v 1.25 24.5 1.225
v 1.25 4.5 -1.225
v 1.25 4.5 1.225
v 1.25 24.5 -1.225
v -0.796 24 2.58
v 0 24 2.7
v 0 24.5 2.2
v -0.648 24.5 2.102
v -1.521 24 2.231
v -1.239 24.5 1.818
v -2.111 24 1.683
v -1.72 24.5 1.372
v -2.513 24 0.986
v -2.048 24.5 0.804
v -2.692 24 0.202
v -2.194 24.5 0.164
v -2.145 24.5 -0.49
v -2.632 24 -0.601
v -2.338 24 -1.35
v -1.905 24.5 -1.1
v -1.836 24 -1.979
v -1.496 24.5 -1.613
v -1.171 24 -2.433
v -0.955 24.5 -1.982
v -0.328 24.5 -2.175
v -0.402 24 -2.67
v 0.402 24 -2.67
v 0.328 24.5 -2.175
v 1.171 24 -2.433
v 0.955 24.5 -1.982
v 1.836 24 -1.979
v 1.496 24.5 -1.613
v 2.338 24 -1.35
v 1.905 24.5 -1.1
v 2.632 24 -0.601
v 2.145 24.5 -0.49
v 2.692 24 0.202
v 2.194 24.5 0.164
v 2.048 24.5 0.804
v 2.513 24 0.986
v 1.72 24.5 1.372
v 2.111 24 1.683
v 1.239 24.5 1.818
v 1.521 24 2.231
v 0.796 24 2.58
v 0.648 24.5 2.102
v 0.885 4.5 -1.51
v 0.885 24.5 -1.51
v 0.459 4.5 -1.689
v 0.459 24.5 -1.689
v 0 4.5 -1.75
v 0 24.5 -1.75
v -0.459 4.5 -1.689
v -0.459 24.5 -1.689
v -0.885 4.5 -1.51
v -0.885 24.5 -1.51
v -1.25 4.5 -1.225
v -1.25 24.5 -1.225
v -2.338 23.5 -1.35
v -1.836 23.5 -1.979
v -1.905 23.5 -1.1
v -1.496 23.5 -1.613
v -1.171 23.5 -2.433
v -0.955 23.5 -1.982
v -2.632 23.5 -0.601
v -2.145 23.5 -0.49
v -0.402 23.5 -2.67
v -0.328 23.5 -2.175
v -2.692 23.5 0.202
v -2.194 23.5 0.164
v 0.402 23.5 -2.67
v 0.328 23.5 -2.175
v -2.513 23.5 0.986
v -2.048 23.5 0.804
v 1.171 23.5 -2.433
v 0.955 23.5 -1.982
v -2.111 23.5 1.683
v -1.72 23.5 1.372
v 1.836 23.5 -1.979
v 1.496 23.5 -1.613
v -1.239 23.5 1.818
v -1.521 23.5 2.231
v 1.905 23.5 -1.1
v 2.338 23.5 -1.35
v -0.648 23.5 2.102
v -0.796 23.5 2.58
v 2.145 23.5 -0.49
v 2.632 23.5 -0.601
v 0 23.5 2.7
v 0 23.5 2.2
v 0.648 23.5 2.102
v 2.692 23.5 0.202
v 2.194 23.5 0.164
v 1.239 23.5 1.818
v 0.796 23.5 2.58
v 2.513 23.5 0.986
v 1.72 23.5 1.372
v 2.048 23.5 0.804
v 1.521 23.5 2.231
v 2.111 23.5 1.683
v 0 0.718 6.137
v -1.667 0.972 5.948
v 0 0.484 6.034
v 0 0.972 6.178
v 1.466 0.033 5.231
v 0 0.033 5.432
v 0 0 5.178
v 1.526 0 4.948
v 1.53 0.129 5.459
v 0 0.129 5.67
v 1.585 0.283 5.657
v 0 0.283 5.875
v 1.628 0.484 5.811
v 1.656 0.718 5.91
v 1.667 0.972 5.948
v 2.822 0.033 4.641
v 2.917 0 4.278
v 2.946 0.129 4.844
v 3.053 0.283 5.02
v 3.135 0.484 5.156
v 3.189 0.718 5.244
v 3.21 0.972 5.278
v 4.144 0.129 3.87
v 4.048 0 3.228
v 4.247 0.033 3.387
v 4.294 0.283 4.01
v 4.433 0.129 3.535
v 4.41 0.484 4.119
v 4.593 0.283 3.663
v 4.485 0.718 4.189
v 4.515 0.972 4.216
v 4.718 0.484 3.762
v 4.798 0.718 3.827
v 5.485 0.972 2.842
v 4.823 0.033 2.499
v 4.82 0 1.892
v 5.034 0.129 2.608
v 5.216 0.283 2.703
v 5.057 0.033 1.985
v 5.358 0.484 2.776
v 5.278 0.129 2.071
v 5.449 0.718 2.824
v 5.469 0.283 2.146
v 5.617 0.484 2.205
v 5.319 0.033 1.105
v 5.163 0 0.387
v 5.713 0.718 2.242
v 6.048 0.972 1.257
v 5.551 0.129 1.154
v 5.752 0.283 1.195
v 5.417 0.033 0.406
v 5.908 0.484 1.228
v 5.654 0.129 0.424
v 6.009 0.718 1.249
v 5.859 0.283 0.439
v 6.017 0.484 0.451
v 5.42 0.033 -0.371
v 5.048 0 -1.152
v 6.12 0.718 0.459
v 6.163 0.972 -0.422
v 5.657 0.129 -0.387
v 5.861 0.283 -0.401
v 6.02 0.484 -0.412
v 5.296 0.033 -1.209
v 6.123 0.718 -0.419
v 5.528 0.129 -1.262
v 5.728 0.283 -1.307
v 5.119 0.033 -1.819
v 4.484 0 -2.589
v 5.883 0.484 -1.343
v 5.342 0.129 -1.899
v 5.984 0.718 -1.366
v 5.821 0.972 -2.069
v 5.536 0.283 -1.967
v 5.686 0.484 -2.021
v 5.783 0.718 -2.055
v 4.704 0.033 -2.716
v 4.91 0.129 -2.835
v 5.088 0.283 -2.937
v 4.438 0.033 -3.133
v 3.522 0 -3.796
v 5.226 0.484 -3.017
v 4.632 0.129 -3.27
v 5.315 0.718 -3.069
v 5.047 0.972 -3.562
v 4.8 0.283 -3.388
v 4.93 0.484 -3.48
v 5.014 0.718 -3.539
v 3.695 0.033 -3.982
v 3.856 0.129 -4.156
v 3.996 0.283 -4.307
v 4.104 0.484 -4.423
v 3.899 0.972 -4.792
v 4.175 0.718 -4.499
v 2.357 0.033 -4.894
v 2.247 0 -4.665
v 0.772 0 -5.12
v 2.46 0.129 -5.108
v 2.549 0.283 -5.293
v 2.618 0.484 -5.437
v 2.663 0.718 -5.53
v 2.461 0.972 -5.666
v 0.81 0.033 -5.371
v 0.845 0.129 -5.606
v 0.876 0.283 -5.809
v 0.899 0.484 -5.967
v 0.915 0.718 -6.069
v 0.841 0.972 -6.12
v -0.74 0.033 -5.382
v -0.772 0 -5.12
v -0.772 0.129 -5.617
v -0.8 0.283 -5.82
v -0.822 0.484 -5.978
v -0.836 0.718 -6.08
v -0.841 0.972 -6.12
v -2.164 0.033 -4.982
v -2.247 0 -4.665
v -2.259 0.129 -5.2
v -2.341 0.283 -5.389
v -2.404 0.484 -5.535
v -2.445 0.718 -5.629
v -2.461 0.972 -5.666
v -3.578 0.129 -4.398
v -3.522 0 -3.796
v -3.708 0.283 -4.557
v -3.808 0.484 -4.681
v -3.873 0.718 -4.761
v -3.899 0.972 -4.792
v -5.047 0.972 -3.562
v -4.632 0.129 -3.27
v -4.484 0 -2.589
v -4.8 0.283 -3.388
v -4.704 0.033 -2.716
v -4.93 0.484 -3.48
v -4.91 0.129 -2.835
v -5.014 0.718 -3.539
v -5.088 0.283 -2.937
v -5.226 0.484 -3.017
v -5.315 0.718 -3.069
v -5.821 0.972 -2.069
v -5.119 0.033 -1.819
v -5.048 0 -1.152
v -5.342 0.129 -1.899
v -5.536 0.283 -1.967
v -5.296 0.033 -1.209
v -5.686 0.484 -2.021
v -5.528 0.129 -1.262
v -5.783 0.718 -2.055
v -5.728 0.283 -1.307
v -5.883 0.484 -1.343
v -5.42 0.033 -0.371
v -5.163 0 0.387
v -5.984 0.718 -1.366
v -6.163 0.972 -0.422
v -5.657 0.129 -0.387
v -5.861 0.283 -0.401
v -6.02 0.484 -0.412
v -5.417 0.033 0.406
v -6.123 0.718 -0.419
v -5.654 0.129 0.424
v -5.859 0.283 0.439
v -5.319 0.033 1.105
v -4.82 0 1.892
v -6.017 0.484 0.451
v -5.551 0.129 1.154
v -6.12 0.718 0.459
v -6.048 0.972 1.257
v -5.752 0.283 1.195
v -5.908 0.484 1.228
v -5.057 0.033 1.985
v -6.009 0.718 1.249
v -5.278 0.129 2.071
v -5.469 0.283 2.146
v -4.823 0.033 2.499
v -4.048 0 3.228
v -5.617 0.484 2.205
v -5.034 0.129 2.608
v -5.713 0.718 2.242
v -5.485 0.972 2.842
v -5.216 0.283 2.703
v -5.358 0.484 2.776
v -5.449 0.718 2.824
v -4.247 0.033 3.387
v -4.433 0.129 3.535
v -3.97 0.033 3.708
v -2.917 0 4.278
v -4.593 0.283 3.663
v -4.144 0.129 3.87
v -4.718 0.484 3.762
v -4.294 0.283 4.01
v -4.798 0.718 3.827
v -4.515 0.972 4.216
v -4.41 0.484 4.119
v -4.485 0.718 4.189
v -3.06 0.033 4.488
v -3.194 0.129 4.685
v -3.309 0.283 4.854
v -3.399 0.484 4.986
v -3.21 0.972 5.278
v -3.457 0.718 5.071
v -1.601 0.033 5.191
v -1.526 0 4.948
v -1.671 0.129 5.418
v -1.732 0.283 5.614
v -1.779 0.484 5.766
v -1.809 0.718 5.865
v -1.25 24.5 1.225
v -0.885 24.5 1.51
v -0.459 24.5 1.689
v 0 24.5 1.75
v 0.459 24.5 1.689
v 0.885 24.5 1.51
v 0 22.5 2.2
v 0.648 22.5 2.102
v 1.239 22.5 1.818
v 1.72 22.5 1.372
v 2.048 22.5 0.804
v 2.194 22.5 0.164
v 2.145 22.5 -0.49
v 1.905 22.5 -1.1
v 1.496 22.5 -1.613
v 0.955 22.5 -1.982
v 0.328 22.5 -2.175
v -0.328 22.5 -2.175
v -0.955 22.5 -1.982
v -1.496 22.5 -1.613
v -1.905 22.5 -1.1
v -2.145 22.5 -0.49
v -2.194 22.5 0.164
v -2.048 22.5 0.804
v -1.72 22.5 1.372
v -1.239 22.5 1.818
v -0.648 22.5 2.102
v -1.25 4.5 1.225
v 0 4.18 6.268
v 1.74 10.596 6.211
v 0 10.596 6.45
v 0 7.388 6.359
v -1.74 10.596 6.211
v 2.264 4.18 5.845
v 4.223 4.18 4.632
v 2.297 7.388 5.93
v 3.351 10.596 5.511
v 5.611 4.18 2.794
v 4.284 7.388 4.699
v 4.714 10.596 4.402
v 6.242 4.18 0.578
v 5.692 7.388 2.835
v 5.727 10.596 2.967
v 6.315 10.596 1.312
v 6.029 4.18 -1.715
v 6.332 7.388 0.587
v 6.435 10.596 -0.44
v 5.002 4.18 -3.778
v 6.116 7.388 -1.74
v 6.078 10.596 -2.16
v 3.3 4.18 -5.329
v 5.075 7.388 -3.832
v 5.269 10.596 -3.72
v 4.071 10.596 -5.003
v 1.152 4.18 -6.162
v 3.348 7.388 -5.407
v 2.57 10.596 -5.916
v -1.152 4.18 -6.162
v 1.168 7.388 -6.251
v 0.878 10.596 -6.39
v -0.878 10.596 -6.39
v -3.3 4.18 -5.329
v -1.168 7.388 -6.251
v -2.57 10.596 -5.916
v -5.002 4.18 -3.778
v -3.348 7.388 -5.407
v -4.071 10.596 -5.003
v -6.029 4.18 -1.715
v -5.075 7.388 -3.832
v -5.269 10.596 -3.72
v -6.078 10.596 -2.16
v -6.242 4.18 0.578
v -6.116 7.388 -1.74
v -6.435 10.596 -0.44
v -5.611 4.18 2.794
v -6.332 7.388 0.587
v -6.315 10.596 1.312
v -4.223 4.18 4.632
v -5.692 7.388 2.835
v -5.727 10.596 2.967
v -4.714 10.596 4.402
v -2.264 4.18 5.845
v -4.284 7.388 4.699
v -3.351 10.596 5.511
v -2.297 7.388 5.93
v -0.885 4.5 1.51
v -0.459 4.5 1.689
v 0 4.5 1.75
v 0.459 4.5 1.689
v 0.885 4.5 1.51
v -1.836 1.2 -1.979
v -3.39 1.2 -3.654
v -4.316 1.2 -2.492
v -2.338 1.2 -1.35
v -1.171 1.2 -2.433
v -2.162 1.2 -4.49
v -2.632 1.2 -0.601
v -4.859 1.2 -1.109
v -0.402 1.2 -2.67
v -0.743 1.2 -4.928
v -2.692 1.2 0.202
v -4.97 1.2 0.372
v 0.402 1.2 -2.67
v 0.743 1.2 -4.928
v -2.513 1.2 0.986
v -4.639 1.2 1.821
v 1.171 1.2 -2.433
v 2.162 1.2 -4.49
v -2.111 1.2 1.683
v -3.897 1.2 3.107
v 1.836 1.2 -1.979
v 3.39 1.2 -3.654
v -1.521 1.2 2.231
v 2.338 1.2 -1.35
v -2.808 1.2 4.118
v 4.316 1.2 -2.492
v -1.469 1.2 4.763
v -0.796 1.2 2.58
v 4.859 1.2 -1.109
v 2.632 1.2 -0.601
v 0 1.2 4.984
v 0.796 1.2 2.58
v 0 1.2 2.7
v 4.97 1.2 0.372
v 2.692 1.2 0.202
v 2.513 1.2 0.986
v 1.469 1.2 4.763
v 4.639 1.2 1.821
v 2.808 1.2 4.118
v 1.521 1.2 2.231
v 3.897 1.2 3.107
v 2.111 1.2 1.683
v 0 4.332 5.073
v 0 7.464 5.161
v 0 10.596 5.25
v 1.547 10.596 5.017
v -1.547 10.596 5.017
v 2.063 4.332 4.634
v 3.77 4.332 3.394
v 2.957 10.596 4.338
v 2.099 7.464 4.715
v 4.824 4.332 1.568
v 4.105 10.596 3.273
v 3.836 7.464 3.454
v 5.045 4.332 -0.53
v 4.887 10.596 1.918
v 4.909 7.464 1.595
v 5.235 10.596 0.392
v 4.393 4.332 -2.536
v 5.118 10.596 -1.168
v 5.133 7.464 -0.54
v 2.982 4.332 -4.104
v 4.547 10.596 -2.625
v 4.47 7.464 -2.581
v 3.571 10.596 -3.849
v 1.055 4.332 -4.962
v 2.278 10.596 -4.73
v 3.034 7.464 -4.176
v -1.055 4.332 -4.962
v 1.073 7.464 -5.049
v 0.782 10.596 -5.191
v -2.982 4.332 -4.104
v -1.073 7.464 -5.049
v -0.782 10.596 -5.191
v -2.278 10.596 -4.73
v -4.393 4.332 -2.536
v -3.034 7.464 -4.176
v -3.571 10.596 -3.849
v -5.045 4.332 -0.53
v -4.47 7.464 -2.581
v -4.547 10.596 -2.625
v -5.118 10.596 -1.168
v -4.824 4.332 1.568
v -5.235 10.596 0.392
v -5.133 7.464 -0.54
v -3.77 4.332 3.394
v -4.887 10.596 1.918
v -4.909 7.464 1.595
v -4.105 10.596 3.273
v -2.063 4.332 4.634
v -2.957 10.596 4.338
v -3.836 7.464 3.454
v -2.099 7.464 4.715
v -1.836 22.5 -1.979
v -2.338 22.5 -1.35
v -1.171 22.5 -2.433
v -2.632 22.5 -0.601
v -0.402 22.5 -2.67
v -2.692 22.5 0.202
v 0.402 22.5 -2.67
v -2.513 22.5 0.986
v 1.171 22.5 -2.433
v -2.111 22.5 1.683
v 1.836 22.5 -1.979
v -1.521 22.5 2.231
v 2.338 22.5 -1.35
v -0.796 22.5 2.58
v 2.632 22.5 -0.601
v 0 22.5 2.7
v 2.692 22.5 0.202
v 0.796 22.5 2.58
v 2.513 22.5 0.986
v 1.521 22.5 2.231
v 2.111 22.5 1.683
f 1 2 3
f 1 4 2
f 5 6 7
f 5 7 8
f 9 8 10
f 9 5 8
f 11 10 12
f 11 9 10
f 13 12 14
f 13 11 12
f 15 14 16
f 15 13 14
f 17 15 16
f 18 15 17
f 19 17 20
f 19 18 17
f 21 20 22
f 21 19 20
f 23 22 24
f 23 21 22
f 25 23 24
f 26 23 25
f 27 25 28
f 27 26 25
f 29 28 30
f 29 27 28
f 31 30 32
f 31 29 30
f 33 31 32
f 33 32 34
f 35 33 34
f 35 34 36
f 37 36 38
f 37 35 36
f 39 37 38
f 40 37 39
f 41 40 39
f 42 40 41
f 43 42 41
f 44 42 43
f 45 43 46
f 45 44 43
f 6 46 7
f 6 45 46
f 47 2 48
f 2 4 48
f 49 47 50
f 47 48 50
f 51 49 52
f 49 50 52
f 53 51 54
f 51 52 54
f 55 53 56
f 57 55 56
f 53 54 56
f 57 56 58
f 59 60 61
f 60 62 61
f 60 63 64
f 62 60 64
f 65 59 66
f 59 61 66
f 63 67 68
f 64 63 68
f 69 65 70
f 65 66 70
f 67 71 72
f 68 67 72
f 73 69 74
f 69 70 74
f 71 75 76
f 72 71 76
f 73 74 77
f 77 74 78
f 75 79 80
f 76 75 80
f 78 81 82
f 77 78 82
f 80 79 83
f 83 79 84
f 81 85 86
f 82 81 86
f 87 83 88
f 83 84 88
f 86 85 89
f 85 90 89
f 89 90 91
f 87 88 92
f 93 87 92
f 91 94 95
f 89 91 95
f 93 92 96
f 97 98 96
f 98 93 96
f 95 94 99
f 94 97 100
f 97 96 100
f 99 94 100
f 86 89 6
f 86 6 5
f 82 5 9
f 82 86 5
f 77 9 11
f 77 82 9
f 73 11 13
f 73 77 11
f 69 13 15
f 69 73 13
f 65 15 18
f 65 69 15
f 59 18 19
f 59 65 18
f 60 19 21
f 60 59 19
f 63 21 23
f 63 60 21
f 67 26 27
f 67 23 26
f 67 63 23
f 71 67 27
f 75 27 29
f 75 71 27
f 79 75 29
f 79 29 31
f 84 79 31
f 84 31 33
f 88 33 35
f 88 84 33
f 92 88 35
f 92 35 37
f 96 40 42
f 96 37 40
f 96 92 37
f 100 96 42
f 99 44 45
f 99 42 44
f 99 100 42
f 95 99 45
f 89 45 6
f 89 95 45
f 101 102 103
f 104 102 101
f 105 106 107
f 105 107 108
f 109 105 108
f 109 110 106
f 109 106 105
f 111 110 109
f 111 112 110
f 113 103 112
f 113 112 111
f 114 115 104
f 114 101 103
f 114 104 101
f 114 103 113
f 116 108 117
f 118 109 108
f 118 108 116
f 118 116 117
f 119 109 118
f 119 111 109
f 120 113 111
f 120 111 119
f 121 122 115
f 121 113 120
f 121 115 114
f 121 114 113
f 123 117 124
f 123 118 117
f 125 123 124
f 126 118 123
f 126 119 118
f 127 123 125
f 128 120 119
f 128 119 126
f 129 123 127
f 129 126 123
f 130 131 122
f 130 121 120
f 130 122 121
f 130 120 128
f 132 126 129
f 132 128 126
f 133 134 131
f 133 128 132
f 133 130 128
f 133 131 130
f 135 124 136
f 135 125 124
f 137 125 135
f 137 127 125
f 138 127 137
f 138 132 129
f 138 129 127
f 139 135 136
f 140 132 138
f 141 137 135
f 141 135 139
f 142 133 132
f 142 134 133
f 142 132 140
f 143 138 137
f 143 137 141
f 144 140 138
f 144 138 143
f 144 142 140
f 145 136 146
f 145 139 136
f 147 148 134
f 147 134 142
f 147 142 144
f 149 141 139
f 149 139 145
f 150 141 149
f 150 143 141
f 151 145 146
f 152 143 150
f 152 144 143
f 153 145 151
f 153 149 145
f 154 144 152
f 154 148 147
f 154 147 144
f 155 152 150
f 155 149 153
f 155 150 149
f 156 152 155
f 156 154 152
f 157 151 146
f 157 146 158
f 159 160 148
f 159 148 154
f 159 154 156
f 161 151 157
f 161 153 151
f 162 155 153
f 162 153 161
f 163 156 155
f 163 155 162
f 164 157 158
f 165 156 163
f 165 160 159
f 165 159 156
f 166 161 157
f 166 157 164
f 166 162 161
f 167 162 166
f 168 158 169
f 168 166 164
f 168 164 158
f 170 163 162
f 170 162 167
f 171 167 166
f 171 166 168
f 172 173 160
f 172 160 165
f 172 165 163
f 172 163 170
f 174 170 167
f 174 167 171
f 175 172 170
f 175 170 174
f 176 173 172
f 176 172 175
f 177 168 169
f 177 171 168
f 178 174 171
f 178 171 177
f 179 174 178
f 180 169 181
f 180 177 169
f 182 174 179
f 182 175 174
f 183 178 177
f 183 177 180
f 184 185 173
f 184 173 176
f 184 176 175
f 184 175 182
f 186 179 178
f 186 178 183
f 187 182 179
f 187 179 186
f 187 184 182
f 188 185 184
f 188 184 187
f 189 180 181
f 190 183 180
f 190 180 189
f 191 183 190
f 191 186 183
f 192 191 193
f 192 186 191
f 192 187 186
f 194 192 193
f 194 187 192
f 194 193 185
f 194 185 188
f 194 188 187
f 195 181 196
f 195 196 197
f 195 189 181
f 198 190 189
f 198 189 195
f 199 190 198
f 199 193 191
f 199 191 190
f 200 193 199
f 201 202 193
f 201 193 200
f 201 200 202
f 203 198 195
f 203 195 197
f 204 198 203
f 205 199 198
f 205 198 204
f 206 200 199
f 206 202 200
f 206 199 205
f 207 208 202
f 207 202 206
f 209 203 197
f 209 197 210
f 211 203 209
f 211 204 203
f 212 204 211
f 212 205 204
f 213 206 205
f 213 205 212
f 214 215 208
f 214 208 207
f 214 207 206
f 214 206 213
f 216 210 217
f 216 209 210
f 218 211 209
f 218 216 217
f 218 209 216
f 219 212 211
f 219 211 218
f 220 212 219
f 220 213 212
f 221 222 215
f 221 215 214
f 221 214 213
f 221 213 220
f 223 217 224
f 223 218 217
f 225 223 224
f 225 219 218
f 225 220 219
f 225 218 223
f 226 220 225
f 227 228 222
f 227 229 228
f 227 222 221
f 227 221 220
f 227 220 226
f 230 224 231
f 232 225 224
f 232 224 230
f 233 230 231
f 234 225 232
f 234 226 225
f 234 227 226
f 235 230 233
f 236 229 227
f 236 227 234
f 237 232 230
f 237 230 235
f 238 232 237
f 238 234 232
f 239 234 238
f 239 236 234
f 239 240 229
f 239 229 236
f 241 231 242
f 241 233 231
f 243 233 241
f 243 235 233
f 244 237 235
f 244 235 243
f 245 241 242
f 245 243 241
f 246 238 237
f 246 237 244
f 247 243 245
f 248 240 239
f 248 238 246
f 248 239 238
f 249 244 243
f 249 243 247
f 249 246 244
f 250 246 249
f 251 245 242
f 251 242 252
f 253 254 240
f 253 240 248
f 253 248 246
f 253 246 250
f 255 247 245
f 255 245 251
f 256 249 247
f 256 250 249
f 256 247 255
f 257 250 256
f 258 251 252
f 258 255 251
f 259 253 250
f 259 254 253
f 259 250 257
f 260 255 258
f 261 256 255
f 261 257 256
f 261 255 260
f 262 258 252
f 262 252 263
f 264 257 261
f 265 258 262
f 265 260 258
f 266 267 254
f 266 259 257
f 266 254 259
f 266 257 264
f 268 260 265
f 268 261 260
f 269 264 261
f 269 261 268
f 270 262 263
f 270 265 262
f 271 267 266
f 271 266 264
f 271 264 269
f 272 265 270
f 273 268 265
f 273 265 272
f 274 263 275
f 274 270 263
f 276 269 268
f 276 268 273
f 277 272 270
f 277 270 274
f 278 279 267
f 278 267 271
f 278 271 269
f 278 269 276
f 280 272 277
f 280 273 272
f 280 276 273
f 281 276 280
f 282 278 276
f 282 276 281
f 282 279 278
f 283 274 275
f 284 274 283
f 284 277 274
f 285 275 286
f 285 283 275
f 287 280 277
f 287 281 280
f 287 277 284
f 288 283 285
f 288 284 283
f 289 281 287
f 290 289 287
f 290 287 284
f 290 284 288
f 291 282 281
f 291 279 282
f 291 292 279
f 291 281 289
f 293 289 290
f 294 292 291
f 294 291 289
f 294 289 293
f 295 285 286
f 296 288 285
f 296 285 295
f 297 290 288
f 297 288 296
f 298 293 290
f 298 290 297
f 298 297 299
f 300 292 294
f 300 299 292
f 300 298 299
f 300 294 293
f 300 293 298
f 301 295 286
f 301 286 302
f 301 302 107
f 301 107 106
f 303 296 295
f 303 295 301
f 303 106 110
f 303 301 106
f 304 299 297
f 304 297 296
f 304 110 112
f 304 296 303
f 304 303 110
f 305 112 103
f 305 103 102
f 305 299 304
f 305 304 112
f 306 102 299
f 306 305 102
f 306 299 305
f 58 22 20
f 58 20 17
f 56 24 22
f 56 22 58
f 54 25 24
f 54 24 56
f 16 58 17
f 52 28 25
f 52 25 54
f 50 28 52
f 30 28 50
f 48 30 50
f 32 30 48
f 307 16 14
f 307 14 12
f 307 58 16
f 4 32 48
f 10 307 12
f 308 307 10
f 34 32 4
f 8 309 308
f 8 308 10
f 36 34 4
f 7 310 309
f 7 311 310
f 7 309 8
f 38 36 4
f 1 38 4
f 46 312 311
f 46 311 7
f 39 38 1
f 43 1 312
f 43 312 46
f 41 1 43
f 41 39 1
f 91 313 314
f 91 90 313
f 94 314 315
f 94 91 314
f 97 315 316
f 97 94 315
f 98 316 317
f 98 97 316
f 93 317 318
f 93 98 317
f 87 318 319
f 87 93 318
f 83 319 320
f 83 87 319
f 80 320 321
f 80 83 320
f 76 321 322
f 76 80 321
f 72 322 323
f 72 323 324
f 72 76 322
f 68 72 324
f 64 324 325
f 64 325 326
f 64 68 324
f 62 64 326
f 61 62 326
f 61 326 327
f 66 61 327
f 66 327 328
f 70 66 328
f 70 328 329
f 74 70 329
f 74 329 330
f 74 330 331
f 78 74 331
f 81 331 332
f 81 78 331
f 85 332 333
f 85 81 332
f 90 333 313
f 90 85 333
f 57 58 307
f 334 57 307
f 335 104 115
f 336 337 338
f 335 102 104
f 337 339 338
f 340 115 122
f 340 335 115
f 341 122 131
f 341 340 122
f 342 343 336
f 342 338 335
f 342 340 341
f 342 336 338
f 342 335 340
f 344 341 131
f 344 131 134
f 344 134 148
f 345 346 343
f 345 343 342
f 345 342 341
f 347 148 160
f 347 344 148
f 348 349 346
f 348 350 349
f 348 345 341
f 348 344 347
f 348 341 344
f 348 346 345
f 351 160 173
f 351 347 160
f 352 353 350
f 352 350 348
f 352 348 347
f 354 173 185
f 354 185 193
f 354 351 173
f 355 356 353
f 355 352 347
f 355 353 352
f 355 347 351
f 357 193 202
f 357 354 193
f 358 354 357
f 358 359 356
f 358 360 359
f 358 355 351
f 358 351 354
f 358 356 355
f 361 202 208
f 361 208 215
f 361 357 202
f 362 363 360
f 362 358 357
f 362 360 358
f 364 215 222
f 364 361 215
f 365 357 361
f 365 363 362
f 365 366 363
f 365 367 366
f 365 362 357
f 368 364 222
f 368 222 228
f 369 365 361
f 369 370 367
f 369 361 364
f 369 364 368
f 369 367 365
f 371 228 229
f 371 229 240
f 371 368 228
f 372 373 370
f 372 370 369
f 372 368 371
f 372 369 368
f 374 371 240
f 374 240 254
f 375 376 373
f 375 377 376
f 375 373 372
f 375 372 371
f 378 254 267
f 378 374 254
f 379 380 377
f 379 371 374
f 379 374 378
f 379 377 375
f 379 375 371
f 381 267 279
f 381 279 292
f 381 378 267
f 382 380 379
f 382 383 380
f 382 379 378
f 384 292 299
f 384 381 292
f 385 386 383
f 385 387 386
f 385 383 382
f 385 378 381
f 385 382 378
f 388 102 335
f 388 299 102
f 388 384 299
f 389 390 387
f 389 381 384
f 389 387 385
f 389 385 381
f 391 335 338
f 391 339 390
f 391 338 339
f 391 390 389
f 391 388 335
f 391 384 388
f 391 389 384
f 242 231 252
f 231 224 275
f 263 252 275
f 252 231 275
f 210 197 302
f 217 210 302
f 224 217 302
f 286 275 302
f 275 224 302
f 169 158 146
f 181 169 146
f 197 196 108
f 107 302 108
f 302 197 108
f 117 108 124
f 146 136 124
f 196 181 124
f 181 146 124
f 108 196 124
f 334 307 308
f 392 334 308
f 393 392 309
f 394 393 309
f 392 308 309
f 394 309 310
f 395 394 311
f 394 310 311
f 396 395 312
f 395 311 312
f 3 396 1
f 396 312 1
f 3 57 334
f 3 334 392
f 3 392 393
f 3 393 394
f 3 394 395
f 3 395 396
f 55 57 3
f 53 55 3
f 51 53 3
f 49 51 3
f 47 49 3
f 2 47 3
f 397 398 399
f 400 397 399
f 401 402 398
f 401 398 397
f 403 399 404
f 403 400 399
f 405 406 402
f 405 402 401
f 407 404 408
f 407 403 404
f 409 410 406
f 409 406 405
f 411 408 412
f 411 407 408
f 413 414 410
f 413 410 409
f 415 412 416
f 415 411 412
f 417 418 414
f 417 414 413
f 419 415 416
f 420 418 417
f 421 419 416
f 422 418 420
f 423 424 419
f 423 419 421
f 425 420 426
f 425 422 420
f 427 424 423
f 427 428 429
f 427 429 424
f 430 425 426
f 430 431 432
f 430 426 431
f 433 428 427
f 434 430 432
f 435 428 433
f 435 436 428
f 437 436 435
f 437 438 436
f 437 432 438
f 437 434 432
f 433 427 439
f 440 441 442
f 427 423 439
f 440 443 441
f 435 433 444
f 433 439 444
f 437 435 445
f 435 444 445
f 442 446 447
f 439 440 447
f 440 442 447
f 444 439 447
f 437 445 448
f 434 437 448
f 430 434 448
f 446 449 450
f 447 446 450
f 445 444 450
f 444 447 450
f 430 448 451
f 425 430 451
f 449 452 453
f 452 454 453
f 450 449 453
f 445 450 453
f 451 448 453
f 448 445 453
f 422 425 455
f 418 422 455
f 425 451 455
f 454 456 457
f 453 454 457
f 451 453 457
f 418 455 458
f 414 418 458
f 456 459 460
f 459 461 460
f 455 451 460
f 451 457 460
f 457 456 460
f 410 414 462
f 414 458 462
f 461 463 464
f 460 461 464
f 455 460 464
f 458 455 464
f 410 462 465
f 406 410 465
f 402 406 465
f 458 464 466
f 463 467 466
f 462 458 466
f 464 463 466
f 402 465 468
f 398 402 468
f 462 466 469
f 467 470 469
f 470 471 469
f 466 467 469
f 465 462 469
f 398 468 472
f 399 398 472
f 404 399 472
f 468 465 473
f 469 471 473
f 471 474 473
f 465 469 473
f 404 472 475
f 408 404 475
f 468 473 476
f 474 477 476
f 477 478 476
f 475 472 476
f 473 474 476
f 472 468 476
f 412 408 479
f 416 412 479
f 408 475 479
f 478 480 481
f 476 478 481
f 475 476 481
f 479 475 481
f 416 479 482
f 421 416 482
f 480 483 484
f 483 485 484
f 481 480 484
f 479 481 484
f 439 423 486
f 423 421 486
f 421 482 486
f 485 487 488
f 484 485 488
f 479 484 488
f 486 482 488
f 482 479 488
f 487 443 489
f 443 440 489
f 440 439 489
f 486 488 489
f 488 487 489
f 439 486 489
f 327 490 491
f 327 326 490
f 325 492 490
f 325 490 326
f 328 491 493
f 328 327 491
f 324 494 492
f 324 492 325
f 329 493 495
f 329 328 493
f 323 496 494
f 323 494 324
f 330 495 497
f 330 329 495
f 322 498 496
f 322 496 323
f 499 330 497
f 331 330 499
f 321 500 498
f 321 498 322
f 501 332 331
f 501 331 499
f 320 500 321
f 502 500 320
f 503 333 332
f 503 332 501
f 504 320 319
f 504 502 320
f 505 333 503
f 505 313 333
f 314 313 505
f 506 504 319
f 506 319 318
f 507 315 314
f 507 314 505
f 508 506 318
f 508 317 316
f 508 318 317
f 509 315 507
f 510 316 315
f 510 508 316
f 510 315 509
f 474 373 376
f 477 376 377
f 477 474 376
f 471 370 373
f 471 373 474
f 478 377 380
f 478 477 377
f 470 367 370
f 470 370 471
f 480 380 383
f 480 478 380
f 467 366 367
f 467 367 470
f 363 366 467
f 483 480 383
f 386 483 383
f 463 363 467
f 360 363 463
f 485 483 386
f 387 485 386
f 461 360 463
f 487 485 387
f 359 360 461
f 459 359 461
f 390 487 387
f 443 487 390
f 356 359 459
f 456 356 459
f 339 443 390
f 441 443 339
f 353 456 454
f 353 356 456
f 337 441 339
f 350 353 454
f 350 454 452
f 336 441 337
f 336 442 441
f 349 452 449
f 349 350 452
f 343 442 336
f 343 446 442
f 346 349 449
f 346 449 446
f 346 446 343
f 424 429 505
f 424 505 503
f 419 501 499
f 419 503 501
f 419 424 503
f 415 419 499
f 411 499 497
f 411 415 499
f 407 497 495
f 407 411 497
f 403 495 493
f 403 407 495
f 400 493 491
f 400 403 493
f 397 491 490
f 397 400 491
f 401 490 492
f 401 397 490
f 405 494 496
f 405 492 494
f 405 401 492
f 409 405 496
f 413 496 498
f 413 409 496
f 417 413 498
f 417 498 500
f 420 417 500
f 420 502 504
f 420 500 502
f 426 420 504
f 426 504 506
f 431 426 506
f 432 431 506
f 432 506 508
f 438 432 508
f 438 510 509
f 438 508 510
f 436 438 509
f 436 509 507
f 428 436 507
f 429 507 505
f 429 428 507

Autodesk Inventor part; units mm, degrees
ref_plane "YZ Plane" through (0, 0, 0) normal (1, 0, 0) x (0, 1, 0)
ref_plane "XZ Plane" through (0, 0, 0) normal (0, 1, 0) x (-1, 0, 0)
ref_plane "XY Plane" through (0, 0, 0) normal (0, 0, 1) x (1, 0, 0)
sketch "Эскиз1" plane through (0, 0, 0) normal (1, 0, 0) x (0, 1, 0)
  line L0 (0, 0) -> (35, 0)
  line L1 (0, 0) -> (0, 6.15)
  line L2 (0, 6.15) -> (10.5958, 6.45)
  line L3 (10.5958, 6.45) -> (10.5958, 5.25)
  line L4 (10.5958, 5.25) -> (1.2, 4.984)
  line L5 (1.2, 4.984) -> (1.2, 2.7)
  line L6 (24.5, 2.7) -> (24.5, 0)
  line L7 (22.5, 2.7) -> (22.5, 2.2)
  line L8 (22.5, 2.2) -> (23.5, 2.2)
  line L9 (23.5, 2.2) -> (23.5, 2.7)
  line L10 (24.5, 2.7) -> (23.5, 2.7)
  line L11 (22.5, 2.7) -> (1.2, 2.7)
  point P0 (0, 3.075)
  dimension "d0" = 35
  dimension "d1" = 6.15
  dimension "d2" = 10.6
  dimension "d4" = 24.5
  dimension "d5" = 2.7
  dimension "d6" = 6.45
  dimension "d7" = 1.2
  dimension "d8" = 1.2
  dimension "d11" = 1
  dimension "d12" = 1
  dimension "d21" = 0.5
  dimension "d22" = 0
revolve "Вращение1" add sketch "Эскиз1" angle 360 about axis through (0, 0, 0) along (0, 1, 0)
fillet "Сопряжение1" radius 1 1 edges at (0, 0, -6.15)
sketch "Эскиз2" plane through (0, 24.5, 0) normal (0, 1, 0) x (1, 0, 0)
  circle A0 centre (0, 0) radius 1.75
  line L0 (-1.25, 1.2247) -> (-1.25, -1.2247)
  line L1 (1.25, 1.2247) -> (1.25, -1.2247)
  dimension "d13" = 3.5
  dimension "d19" = 1.25
  dimension "d20" = 1.25
extrude "Выдавливание1" cut sketch "Эскиз2" against normal blind 20 contours L1 A0 L0
chamfer "Фаска1" distance 0.5 angle 45 1 edges at (0, 24.5, -2.7)
properties part number "Кнопка для кухонной плиты"
